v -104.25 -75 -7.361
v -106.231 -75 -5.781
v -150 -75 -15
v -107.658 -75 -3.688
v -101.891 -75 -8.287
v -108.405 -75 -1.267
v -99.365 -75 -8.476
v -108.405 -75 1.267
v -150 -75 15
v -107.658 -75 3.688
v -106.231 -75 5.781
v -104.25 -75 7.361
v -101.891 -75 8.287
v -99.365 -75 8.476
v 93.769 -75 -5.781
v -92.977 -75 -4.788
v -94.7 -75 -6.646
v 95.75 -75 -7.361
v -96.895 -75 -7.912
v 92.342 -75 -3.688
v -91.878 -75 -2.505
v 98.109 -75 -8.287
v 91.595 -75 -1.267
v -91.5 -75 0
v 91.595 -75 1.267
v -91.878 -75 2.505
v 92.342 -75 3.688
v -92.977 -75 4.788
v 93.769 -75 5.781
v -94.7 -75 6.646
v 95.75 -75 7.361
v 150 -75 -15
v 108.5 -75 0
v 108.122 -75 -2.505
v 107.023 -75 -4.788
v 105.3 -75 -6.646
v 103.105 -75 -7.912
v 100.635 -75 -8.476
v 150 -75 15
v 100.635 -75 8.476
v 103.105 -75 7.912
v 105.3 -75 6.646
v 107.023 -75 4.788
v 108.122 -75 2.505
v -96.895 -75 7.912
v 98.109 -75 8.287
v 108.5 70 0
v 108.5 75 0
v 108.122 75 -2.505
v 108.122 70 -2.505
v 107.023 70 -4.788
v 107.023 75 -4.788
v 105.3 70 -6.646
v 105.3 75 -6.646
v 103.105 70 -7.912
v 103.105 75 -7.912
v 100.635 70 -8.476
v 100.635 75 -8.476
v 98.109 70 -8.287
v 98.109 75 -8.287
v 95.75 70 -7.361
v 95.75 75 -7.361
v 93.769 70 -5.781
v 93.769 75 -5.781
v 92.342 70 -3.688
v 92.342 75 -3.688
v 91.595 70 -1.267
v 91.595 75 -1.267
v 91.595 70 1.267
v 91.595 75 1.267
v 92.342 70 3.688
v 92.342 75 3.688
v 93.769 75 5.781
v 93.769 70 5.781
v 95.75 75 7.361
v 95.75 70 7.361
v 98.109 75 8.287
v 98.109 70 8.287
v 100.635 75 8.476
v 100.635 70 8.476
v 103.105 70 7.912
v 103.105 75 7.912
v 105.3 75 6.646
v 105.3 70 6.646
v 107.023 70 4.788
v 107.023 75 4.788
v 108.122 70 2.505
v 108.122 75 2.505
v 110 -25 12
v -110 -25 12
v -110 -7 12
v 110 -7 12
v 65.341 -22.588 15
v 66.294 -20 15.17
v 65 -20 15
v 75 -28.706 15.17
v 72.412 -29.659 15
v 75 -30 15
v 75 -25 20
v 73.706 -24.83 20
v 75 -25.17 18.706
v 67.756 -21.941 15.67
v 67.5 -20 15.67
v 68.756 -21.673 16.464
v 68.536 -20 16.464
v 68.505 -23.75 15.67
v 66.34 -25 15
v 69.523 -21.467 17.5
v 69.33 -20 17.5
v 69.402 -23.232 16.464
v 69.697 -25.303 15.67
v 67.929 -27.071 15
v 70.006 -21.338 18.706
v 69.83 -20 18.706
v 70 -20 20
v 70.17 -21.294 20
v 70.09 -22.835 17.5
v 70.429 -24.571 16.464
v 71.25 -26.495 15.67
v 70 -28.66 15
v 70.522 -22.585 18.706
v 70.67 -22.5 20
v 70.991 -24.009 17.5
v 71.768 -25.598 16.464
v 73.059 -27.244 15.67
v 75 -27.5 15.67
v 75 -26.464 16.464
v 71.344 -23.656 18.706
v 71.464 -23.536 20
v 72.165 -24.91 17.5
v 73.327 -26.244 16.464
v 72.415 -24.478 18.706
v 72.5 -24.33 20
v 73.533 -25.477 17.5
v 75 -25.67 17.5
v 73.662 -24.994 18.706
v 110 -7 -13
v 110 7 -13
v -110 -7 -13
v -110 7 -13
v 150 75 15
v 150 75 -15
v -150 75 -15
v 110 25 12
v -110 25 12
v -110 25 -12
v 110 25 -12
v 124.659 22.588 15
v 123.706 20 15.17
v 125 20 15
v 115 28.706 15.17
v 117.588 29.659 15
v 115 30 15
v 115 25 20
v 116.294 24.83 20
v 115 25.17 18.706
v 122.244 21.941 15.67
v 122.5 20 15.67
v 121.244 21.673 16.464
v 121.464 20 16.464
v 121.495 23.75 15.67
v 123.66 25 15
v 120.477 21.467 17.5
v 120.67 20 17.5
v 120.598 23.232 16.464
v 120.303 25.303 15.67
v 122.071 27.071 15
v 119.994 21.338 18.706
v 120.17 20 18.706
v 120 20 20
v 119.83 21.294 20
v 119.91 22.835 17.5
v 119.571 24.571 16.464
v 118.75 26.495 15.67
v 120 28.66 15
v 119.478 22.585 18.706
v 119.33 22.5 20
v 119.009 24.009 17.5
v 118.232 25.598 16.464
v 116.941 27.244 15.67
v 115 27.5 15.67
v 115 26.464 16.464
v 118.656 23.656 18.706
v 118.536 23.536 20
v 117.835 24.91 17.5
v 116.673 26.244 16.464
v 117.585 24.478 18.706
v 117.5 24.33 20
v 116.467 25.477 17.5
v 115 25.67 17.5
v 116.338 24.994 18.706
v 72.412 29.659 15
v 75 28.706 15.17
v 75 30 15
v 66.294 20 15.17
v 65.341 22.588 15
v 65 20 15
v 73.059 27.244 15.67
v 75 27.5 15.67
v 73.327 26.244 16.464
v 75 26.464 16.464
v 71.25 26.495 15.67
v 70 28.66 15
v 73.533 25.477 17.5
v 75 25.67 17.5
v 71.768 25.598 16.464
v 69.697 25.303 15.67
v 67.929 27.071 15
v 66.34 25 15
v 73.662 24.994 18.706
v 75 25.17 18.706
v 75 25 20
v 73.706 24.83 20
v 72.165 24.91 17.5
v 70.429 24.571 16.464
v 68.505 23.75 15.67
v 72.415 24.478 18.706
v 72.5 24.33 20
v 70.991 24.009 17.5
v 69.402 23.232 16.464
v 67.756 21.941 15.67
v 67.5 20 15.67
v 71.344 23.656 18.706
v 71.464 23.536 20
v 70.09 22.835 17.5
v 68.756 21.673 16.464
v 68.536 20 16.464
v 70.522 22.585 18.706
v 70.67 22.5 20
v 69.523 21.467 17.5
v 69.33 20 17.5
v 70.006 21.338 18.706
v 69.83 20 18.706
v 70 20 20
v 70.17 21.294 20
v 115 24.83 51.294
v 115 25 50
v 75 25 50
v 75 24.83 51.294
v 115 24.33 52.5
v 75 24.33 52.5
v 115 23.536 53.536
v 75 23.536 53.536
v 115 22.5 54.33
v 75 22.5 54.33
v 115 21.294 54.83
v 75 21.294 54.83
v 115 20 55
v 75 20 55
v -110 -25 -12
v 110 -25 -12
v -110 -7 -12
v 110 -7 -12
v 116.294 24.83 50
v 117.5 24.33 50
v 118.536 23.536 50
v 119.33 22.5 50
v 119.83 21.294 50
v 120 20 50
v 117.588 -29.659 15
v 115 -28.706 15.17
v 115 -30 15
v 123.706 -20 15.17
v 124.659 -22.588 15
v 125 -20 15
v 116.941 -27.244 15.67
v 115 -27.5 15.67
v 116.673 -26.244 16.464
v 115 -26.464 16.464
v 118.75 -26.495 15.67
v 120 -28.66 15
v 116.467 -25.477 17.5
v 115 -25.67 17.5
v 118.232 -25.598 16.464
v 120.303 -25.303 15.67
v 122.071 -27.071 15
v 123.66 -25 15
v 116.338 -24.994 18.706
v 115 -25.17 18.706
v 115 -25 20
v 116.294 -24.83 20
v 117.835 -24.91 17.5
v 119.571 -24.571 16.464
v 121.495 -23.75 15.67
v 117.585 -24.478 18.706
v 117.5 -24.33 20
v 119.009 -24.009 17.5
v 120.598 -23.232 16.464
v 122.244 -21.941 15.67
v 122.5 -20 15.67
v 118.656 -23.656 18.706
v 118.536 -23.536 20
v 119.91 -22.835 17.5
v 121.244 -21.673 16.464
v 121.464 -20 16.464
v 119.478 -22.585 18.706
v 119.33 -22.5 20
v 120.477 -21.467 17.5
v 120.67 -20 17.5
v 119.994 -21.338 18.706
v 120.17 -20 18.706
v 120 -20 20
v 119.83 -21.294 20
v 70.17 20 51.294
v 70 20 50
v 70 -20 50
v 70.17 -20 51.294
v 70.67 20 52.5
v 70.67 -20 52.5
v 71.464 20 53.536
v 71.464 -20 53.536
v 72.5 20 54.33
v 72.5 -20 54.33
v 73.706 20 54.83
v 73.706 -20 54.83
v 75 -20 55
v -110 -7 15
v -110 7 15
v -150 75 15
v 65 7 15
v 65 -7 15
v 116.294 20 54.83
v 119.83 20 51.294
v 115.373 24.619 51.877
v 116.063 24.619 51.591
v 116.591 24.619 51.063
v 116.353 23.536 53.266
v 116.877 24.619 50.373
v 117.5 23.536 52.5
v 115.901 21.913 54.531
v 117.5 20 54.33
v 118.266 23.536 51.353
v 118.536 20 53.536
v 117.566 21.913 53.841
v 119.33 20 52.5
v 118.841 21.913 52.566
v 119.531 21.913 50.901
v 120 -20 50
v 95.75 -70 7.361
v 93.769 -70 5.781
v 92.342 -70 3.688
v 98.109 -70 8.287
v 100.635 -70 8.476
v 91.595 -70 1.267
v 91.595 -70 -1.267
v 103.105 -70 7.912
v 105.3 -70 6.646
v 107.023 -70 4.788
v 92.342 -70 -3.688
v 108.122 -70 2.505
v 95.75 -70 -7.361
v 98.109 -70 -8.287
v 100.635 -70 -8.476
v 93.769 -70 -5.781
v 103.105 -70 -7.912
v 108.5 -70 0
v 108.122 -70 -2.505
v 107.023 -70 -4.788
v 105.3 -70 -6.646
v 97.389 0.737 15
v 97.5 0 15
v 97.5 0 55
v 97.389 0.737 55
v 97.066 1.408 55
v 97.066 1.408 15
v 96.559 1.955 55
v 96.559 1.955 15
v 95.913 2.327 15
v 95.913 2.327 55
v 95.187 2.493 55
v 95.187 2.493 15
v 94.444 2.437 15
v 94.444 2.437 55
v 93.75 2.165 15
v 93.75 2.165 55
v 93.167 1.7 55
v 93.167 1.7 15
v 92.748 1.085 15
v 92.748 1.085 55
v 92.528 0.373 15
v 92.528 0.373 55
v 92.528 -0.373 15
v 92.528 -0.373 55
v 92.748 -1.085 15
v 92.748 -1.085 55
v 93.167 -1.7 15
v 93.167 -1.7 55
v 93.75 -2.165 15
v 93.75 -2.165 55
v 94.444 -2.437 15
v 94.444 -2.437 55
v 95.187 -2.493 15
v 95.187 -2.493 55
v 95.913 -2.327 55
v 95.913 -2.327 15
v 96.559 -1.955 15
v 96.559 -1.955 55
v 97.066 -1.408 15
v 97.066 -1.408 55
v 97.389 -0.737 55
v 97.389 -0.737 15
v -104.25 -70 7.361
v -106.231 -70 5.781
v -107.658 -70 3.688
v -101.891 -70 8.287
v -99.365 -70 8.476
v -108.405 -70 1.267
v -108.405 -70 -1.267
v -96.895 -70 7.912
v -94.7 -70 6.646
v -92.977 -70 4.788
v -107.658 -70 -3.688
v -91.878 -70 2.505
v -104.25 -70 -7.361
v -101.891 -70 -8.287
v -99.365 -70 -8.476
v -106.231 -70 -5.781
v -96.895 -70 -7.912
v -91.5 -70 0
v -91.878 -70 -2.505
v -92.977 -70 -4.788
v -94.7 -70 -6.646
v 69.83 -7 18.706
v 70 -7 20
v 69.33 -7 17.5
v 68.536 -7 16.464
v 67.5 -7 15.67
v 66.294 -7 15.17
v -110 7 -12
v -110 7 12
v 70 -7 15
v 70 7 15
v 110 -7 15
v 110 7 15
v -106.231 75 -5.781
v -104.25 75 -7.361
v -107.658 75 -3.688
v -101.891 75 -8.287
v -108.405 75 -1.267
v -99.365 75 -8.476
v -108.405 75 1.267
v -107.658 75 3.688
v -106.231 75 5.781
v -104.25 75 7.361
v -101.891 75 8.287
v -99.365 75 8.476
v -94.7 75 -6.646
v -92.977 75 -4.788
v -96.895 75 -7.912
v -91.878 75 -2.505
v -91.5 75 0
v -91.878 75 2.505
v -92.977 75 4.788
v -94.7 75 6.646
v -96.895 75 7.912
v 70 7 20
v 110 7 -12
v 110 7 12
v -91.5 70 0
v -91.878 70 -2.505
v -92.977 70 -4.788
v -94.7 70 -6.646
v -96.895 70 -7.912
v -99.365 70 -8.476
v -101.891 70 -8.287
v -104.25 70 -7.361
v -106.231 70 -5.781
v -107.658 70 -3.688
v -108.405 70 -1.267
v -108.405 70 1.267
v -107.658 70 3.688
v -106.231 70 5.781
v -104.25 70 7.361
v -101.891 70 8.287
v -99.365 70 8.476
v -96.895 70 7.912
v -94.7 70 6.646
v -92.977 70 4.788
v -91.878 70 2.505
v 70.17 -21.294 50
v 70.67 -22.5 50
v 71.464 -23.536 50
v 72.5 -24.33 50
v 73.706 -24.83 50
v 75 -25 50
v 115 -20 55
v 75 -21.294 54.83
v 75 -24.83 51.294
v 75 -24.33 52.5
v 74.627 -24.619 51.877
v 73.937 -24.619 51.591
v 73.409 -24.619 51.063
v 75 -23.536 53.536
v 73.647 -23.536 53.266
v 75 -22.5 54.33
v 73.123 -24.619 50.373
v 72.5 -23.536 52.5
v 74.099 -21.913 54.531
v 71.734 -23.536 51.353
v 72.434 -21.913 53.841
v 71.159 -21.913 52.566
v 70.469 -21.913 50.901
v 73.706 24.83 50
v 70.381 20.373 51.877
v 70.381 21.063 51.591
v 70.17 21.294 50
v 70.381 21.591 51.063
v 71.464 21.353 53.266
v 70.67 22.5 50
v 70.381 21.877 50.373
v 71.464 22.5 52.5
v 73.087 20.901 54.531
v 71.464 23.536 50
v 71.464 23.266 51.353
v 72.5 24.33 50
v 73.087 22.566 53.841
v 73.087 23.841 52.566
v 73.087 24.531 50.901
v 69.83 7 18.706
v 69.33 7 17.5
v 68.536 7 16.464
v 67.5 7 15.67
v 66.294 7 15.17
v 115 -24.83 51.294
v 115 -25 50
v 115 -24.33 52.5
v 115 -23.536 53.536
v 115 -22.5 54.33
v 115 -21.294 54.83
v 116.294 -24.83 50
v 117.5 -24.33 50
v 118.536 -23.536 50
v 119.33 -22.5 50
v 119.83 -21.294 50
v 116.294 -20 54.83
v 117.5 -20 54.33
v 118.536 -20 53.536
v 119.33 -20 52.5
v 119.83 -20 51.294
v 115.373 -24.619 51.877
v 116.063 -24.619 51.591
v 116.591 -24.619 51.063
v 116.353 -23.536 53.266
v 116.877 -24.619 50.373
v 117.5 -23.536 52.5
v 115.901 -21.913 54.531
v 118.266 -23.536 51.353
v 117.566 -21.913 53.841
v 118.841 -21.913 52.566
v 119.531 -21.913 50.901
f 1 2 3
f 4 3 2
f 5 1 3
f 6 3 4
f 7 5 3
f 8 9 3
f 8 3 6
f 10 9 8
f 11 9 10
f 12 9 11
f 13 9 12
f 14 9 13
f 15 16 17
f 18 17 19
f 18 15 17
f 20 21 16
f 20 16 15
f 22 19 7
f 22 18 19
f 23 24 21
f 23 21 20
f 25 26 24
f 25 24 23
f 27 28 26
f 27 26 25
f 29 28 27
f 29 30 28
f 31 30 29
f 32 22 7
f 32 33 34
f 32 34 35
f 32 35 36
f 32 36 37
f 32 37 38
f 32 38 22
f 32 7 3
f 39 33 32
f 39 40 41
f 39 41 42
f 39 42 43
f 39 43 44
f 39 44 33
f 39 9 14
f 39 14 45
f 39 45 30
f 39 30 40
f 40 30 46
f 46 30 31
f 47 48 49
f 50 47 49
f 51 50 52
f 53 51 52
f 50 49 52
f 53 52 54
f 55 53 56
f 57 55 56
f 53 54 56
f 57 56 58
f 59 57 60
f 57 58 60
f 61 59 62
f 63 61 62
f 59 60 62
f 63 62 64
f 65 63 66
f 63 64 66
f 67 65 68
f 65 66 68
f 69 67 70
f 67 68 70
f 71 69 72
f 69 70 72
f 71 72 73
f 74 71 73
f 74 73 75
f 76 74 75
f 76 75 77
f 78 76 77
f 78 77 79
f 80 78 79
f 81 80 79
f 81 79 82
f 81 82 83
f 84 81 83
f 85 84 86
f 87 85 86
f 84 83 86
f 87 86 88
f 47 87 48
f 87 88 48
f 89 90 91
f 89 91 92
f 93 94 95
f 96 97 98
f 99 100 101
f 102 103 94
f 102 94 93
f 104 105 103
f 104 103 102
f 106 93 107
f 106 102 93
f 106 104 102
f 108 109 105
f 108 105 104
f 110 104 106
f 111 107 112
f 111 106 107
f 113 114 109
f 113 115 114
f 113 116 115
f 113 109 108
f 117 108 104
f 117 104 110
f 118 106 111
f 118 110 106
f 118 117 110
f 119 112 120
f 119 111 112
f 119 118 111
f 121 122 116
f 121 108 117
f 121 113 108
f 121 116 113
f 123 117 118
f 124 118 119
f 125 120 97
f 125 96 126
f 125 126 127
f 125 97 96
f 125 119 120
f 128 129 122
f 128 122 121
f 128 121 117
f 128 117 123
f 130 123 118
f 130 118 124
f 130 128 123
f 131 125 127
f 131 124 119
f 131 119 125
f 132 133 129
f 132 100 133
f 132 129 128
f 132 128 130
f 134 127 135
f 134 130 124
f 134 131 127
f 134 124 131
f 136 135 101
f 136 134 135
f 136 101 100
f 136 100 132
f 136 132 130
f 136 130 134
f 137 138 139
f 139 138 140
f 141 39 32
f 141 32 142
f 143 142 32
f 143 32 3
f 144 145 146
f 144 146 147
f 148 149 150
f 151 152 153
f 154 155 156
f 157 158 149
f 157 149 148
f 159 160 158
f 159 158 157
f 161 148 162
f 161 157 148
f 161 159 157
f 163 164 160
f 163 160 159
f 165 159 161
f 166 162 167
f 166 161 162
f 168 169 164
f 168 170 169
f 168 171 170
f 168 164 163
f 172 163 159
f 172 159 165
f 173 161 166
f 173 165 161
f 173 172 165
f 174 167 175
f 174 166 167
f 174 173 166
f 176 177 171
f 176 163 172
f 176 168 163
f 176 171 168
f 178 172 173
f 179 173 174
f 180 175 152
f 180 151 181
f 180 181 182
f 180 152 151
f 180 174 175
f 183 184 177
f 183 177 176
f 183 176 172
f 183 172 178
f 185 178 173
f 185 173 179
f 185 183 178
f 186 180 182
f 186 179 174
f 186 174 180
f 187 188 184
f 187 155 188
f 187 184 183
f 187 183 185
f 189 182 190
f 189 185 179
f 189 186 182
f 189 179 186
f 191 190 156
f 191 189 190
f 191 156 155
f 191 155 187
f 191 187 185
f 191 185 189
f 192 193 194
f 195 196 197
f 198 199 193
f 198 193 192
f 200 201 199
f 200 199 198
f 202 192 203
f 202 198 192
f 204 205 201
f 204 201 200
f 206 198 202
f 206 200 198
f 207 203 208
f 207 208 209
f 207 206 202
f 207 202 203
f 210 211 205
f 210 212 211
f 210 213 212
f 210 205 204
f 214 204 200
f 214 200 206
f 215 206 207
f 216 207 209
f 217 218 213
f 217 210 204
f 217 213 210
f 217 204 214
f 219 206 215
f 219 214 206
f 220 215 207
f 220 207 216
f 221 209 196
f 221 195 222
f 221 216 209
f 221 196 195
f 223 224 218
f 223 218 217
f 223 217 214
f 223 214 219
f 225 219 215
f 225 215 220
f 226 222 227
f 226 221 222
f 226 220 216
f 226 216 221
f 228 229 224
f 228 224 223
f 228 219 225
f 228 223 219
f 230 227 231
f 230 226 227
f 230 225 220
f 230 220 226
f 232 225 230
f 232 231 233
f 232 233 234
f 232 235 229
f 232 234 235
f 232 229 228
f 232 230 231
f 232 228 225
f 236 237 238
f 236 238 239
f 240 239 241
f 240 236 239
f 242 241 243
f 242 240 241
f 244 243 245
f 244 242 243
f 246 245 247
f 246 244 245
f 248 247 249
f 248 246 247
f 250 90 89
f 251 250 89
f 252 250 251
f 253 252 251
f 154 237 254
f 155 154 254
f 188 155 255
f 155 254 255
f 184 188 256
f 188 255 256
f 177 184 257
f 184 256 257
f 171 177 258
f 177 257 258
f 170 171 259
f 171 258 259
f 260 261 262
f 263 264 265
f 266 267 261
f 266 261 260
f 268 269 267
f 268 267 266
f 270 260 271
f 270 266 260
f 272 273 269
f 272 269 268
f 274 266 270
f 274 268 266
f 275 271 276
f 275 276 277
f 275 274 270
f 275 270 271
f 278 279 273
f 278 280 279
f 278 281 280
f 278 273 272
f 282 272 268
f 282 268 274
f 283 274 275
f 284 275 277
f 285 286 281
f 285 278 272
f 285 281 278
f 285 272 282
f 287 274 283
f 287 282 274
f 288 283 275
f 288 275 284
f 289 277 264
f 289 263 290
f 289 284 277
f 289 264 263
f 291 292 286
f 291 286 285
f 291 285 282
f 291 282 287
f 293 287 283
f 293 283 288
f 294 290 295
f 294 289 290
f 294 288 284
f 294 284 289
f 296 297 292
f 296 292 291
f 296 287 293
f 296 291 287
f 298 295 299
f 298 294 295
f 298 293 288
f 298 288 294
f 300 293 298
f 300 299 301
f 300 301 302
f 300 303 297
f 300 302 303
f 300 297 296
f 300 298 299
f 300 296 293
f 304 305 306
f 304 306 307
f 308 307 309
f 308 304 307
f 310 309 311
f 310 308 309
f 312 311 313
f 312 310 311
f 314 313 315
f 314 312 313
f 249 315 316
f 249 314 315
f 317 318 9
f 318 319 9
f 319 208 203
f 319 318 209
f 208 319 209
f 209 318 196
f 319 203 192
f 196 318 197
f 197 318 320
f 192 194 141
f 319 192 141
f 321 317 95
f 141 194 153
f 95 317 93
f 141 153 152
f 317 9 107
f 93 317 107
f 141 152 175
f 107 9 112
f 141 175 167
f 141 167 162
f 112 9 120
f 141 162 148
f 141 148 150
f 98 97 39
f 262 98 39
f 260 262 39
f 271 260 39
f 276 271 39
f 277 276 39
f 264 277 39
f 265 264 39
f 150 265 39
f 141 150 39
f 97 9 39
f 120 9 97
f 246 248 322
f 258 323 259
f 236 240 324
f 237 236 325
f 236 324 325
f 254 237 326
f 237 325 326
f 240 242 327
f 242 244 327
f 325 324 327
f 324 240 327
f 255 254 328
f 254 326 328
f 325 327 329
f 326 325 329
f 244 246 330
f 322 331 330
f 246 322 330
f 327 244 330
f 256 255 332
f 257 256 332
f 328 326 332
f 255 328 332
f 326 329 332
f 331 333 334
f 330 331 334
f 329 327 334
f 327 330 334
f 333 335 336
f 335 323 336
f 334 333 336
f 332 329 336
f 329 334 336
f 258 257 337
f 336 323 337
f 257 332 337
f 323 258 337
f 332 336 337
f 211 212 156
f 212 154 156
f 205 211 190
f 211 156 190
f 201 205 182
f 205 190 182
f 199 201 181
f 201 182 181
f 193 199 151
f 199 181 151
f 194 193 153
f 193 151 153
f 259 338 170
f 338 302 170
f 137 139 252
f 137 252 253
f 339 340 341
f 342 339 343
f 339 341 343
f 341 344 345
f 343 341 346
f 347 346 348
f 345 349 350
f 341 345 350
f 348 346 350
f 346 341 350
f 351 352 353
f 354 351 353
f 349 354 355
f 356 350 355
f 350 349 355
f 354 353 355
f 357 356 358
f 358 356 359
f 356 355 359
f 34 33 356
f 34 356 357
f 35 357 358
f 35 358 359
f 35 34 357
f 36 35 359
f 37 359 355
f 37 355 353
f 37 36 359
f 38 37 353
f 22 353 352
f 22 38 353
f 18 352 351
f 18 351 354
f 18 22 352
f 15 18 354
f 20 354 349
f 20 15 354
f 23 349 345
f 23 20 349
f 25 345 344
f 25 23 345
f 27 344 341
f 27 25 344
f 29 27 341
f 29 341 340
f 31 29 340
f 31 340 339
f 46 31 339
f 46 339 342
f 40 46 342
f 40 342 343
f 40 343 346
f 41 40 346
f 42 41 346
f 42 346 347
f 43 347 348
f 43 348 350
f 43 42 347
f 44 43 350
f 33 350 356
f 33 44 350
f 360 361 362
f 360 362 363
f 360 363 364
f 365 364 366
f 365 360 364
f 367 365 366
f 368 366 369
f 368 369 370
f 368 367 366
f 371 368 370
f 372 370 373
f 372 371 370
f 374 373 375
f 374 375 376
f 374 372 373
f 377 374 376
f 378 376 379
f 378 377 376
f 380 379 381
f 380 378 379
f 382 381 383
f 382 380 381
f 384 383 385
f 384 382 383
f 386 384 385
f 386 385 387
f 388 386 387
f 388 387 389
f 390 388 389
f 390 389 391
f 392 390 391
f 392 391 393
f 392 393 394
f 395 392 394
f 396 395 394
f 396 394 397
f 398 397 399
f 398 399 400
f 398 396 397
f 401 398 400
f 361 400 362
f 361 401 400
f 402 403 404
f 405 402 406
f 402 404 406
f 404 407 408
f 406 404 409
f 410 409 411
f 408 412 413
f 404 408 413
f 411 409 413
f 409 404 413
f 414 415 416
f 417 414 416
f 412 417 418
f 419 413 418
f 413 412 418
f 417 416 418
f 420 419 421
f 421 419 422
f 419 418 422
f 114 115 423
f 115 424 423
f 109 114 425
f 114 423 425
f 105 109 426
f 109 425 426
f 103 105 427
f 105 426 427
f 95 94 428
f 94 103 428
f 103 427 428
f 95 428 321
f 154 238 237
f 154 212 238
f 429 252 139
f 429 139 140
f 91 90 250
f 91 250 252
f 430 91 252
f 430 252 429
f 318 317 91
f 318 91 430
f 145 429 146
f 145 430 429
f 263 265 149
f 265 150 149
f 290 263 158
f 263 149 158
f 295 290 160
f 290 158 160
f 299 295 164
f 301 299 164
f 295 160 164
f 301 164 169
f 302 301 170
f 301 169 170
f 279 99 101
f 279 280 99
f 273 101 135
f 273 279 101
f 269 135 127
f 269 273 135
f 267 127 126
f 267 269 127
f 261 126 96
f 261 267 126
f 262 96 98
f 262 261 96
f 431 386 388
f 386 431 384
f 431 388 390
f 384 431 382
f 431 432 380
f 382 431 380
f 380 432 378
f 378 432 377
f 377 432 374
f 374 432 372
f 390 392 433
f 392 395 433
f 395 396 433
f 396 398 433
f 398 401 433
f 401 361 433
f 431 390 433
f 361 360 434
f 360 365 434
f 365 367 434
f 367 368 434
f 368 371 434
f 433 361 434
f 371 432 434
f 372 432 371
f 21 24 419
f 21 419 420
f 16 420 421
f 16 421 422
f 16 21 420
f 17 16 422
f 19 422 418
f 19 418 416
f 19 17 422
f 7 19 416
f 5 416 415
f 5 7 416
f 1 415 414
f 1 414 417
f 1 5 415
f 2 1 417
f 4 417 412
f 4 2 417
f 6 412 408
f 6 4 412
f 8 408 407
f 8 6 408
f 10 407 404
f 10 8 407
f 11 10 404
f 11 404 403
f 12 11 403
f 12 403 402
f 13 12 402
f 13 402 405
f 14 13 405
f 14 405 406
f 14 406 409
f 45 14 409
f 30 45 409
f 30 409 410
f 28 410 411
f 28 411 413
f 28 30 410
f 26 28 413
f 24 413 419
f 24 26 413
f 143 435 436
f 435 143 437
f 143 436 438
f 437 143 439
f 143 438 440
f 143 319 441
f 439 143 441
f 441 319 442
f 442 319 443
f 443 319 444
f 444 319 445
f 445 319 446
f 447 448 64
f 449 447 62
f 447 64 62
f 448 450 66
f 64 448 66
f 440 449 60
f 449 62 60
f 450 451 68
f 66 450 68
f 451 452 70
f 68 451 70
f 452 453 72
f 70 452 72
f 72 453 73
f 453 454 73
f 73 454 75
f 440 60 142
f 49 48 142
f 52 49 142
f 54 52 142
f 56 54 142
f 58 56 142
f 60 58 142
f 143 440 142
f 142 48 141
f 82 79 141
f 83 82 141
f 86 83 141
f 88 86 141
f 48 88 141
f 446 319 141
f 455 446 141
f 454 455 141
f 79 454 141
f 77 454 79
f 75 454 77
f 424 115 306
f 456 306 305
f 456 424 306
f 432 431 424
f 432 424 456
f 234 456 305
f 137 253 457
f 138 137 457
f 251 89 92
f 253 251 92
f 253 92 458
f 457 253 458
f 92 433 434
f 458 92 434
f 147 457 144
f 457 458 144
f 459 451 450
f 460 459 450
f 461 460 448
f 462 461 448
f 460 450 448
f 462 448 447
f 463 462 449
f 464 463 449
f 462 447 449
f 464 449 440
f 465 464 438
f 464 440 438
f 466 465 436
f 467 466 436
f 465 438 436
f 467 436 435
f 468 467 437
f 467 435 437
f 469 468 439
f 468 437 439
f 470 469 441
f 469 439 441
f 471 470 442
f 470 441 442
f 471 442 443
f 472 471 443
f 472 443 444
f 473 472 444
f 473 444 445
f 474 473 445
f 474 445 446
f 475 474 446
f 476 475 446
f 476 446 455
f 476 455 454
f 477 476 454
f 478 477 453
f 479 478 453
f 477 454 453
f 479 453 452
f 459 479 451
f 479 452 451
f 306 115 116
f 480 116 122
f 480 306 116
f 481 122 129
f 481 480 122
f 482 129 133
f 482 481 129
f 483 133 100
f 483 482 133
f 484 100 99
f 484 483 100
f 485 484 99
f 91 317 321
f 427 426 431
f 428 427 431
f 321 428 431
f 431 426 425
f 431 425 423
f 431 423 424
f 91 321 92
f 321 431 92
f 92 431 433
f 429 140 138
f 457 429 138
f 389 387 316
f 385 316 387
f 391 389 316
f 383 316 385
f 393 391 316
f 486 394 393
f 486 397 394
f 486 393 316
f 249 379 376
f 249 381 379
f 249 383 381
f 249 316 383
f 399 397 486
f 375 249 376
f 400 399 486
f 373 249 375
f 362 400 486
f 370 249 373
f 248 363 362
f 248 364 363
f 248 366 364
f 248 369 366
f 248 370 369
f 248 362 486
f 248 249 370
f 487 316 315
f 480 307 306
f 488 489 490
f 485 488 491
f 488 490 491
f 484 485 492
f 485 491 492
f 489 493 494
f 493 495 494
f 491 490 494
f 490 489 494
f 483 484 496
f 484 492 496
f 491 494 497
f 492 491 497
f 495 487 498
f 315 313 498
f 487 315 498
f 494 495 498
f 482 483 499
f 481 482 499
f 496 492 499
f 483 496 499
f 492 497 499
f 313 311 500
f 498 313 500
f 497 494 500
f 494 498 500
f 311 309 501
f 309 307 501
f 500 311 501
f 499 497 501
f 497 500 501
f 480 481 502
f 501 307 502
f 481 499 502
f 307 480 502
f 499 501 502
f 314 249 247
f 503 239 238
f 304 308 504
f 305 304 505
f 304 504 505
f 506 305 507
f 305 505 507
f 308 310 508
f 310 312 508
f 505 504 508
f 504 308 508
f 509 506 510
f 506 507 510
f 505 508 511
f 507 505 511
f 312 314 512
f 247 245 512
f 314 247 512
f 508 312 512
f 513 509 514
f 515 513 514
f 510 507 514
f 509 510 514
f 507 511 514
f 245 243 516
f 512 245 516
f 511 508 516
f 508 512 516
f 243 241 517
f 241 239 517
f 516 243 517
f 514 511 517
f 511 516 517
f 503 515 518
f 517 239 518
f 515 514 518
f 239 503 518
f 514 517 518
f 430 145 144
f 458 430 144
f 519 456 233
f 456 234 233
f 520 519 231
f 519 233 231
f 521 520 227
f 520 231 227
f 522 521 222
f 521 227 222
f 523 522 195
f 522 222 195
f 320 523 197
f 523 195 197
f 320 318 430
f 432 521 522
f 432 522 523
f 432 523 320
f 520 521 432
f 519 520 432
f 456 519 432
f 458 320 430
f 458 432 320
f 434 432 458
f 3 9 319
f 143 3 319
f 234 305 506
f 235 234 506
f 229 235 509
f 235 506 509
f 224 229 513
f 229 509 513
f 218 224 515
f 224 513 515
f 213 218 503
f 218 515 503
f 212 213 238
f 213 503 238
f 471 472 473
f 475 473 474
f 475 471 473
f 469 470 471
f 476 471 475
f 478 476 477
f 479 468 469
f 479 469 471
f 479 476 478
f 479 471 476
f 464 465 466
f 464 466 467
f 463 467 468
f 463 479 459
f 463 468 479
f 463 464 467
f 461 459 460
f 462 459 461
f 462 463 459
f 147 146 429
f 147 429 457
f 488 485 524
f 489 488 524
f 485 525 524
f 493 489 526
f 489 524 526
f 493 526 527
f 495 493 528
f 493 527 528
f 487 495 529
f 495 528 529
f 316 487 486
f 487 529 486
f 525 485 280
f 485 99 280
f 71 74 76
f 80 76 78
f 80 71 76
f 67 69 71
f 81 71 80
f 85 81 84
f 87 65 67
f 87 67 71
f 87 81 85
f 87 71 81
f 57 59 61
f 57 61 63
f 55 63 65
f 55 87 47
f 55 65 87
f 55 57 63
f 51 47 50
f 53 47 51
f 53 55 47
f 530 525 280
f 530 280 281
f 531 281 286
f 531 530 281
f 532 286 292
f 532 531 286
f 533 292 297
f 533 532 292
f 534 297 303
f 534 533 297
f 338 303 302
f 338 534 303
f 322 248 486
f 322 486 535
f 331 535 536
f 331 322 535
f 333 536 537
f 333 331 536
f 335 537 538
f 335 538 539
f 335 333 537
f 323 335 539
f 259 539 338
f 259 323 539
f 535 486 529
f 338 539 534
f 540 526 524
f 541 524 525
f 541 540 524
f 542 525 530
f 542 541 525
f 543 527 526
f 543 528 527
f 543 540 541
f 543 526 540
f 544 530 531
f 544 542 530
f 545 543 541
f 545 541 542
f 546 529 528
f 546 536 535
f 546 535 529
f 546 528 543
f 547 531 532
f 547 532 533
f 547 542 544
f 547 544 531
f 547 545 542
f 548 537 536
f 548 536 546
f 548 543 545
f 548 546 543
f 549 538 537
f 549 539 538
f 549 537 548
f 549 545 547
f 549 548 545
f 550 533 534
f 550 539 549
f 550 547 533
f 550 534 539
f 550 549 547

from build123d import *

# Parameters (mm, degrees)
SKETCH1_W               = 300
SKETCH1_H               = 150
SKETCH1_W_2             = 220
SKETCH1_H_2             = 50
BOSS_EXTRUDE2_DEPTH     = 15
SKETCH2_W               = 220
SKETCH2_H               = 18
BOSS_EXTRUDE3_DEPTH     = 3
MIRROR2_COPY_1_SKETCH_W = 220
MIRROR2_COPY_1_SKETCH_H = 18
MIRROR2_COPY_1_DEPTH    = 3
SKETCH3_W               = 220
SKETCH3_H               = 14
BOSS_EXTRUDE4_DEPTH     = 2
SKETCH5_R               = 8.5
CUT_EXTRUDE2_DEPTH      = 5
SKETCH6_W               = 50
SKETCH6_H               = 50
SKETCH6_R               = 2.5
BOSS_EXTRUDE5_DEPTH     = 40
FILLET3_R               = 5


with BuildPart() as part:
    # Sketch1 → Boss-Extrude2 (new body, symmetric)
    with BuildSketch(Plane.XY):
        Rectangle(SKETCH1_W, SKETCH1_H)
        Rectangle(SKETCH1_W_2, SKETCH1_H_2, mode=Mode.SUBTRACT)
    extrude(amount=BOSS_EXTRUDE2_DEPTH, both=True)

    # Sketch2 → Boss-Extrude3 (add)
    with BuildSketch(Plane.XY.offset(15)):
        with Locations((0, 16)):
            Rectangle(SKETCH2_W, SKETCH2_H)
    boss_extrude3 = extrude(amount=-BOSS_EXTRUDE3_DEPTH)

    # Mirror1: Boss-Extrude3 across plane
    add(boss_extrude3.mirror(Plane.XY))

    # Mirror2: Boss-Extrude3 across plane
    add(boss_extrude3.mirror(Plane.ZX))

    # Mirror2 copy 1 sketch → Mirror2 copy 1 (add)
    with BuildSketch(Plane(origin=(0, 0, -15), x_dir=(1, 0, 0), z_dir=(0, 0, -1))):
        with Locations((0, 16)):
            Rectangle(MIRROR2_COPY_1_SKETCH_W, MIRROR2_COPY_1_SKETCH_H)
    extrude(amount=-MIRROR2_COPY_1_DEPTH)

    # Sketch3 → Boss-Extrude4 (add)
    with BuildSketch(Plane(origin=(0, 0, -15), x_dir=(-1, 0, 0), z_dir=(0, 0, -1))):
        Rectangle(SKETCH3_W, SKETCH3_H)
    extrude(amount=-BOSS_EXTRUDE4_DEPTH)

    # Sketch5 → Cut-Extrude2 (cut)
    with BuildSketch(Plane(origin=(0, 75, 0), x_dir=(1, 0, 0), z_dir=(0, 1, 0))):
        with Locations((-100, 0)):
            Circle(SKETCH5_R)
        with Locations((100, 0)):
            Circle(SKETCH5_R)
    cut_extrude2 = extrude(amount=-CUT_EXTRUDE2_DEPTH, mode=Mode.SUBTRACT)

    # Mirror3: Cut-Extrude2 across plane
    add(cut_extrude2.mirror(Plane.ZX), mode=Mode.SUBTRACT)

    # Sketch6 → Boss-Extrude5 (add)
    with BuildSketch(Plane.XY.offset(15)):
        with Locations((95, 0)):
            Rectangle(SKETCH6_W, SKETCH6_H)
        with Locations((95, 0)):
            Circle(SKETCH6_R, mode=Mode.SUBTRACT)
    extrude(amount=BOSS_EXTRUDE5_DEPTH)

    # Fillet3
    fillet3_edges = [part.edges().sort_by_distance(p)[0] for p in [
        (70, -16, 15),
        (120, 0, 55),
        (95, 25, 55),
        (70, 0, 55),
        (95, -25, 55),
        (120, 0, 15),
        (120, -25, 35),
        (95, 25, 15),
        (120, 25, 35),
        (70, 16, 15),
        (70, 25, 35),
        (95, -25, 15),
        (70, -25, 35),
    ]]
    fillet(fillet3_edges, radius=FILLET3_R)


solid = part.part
